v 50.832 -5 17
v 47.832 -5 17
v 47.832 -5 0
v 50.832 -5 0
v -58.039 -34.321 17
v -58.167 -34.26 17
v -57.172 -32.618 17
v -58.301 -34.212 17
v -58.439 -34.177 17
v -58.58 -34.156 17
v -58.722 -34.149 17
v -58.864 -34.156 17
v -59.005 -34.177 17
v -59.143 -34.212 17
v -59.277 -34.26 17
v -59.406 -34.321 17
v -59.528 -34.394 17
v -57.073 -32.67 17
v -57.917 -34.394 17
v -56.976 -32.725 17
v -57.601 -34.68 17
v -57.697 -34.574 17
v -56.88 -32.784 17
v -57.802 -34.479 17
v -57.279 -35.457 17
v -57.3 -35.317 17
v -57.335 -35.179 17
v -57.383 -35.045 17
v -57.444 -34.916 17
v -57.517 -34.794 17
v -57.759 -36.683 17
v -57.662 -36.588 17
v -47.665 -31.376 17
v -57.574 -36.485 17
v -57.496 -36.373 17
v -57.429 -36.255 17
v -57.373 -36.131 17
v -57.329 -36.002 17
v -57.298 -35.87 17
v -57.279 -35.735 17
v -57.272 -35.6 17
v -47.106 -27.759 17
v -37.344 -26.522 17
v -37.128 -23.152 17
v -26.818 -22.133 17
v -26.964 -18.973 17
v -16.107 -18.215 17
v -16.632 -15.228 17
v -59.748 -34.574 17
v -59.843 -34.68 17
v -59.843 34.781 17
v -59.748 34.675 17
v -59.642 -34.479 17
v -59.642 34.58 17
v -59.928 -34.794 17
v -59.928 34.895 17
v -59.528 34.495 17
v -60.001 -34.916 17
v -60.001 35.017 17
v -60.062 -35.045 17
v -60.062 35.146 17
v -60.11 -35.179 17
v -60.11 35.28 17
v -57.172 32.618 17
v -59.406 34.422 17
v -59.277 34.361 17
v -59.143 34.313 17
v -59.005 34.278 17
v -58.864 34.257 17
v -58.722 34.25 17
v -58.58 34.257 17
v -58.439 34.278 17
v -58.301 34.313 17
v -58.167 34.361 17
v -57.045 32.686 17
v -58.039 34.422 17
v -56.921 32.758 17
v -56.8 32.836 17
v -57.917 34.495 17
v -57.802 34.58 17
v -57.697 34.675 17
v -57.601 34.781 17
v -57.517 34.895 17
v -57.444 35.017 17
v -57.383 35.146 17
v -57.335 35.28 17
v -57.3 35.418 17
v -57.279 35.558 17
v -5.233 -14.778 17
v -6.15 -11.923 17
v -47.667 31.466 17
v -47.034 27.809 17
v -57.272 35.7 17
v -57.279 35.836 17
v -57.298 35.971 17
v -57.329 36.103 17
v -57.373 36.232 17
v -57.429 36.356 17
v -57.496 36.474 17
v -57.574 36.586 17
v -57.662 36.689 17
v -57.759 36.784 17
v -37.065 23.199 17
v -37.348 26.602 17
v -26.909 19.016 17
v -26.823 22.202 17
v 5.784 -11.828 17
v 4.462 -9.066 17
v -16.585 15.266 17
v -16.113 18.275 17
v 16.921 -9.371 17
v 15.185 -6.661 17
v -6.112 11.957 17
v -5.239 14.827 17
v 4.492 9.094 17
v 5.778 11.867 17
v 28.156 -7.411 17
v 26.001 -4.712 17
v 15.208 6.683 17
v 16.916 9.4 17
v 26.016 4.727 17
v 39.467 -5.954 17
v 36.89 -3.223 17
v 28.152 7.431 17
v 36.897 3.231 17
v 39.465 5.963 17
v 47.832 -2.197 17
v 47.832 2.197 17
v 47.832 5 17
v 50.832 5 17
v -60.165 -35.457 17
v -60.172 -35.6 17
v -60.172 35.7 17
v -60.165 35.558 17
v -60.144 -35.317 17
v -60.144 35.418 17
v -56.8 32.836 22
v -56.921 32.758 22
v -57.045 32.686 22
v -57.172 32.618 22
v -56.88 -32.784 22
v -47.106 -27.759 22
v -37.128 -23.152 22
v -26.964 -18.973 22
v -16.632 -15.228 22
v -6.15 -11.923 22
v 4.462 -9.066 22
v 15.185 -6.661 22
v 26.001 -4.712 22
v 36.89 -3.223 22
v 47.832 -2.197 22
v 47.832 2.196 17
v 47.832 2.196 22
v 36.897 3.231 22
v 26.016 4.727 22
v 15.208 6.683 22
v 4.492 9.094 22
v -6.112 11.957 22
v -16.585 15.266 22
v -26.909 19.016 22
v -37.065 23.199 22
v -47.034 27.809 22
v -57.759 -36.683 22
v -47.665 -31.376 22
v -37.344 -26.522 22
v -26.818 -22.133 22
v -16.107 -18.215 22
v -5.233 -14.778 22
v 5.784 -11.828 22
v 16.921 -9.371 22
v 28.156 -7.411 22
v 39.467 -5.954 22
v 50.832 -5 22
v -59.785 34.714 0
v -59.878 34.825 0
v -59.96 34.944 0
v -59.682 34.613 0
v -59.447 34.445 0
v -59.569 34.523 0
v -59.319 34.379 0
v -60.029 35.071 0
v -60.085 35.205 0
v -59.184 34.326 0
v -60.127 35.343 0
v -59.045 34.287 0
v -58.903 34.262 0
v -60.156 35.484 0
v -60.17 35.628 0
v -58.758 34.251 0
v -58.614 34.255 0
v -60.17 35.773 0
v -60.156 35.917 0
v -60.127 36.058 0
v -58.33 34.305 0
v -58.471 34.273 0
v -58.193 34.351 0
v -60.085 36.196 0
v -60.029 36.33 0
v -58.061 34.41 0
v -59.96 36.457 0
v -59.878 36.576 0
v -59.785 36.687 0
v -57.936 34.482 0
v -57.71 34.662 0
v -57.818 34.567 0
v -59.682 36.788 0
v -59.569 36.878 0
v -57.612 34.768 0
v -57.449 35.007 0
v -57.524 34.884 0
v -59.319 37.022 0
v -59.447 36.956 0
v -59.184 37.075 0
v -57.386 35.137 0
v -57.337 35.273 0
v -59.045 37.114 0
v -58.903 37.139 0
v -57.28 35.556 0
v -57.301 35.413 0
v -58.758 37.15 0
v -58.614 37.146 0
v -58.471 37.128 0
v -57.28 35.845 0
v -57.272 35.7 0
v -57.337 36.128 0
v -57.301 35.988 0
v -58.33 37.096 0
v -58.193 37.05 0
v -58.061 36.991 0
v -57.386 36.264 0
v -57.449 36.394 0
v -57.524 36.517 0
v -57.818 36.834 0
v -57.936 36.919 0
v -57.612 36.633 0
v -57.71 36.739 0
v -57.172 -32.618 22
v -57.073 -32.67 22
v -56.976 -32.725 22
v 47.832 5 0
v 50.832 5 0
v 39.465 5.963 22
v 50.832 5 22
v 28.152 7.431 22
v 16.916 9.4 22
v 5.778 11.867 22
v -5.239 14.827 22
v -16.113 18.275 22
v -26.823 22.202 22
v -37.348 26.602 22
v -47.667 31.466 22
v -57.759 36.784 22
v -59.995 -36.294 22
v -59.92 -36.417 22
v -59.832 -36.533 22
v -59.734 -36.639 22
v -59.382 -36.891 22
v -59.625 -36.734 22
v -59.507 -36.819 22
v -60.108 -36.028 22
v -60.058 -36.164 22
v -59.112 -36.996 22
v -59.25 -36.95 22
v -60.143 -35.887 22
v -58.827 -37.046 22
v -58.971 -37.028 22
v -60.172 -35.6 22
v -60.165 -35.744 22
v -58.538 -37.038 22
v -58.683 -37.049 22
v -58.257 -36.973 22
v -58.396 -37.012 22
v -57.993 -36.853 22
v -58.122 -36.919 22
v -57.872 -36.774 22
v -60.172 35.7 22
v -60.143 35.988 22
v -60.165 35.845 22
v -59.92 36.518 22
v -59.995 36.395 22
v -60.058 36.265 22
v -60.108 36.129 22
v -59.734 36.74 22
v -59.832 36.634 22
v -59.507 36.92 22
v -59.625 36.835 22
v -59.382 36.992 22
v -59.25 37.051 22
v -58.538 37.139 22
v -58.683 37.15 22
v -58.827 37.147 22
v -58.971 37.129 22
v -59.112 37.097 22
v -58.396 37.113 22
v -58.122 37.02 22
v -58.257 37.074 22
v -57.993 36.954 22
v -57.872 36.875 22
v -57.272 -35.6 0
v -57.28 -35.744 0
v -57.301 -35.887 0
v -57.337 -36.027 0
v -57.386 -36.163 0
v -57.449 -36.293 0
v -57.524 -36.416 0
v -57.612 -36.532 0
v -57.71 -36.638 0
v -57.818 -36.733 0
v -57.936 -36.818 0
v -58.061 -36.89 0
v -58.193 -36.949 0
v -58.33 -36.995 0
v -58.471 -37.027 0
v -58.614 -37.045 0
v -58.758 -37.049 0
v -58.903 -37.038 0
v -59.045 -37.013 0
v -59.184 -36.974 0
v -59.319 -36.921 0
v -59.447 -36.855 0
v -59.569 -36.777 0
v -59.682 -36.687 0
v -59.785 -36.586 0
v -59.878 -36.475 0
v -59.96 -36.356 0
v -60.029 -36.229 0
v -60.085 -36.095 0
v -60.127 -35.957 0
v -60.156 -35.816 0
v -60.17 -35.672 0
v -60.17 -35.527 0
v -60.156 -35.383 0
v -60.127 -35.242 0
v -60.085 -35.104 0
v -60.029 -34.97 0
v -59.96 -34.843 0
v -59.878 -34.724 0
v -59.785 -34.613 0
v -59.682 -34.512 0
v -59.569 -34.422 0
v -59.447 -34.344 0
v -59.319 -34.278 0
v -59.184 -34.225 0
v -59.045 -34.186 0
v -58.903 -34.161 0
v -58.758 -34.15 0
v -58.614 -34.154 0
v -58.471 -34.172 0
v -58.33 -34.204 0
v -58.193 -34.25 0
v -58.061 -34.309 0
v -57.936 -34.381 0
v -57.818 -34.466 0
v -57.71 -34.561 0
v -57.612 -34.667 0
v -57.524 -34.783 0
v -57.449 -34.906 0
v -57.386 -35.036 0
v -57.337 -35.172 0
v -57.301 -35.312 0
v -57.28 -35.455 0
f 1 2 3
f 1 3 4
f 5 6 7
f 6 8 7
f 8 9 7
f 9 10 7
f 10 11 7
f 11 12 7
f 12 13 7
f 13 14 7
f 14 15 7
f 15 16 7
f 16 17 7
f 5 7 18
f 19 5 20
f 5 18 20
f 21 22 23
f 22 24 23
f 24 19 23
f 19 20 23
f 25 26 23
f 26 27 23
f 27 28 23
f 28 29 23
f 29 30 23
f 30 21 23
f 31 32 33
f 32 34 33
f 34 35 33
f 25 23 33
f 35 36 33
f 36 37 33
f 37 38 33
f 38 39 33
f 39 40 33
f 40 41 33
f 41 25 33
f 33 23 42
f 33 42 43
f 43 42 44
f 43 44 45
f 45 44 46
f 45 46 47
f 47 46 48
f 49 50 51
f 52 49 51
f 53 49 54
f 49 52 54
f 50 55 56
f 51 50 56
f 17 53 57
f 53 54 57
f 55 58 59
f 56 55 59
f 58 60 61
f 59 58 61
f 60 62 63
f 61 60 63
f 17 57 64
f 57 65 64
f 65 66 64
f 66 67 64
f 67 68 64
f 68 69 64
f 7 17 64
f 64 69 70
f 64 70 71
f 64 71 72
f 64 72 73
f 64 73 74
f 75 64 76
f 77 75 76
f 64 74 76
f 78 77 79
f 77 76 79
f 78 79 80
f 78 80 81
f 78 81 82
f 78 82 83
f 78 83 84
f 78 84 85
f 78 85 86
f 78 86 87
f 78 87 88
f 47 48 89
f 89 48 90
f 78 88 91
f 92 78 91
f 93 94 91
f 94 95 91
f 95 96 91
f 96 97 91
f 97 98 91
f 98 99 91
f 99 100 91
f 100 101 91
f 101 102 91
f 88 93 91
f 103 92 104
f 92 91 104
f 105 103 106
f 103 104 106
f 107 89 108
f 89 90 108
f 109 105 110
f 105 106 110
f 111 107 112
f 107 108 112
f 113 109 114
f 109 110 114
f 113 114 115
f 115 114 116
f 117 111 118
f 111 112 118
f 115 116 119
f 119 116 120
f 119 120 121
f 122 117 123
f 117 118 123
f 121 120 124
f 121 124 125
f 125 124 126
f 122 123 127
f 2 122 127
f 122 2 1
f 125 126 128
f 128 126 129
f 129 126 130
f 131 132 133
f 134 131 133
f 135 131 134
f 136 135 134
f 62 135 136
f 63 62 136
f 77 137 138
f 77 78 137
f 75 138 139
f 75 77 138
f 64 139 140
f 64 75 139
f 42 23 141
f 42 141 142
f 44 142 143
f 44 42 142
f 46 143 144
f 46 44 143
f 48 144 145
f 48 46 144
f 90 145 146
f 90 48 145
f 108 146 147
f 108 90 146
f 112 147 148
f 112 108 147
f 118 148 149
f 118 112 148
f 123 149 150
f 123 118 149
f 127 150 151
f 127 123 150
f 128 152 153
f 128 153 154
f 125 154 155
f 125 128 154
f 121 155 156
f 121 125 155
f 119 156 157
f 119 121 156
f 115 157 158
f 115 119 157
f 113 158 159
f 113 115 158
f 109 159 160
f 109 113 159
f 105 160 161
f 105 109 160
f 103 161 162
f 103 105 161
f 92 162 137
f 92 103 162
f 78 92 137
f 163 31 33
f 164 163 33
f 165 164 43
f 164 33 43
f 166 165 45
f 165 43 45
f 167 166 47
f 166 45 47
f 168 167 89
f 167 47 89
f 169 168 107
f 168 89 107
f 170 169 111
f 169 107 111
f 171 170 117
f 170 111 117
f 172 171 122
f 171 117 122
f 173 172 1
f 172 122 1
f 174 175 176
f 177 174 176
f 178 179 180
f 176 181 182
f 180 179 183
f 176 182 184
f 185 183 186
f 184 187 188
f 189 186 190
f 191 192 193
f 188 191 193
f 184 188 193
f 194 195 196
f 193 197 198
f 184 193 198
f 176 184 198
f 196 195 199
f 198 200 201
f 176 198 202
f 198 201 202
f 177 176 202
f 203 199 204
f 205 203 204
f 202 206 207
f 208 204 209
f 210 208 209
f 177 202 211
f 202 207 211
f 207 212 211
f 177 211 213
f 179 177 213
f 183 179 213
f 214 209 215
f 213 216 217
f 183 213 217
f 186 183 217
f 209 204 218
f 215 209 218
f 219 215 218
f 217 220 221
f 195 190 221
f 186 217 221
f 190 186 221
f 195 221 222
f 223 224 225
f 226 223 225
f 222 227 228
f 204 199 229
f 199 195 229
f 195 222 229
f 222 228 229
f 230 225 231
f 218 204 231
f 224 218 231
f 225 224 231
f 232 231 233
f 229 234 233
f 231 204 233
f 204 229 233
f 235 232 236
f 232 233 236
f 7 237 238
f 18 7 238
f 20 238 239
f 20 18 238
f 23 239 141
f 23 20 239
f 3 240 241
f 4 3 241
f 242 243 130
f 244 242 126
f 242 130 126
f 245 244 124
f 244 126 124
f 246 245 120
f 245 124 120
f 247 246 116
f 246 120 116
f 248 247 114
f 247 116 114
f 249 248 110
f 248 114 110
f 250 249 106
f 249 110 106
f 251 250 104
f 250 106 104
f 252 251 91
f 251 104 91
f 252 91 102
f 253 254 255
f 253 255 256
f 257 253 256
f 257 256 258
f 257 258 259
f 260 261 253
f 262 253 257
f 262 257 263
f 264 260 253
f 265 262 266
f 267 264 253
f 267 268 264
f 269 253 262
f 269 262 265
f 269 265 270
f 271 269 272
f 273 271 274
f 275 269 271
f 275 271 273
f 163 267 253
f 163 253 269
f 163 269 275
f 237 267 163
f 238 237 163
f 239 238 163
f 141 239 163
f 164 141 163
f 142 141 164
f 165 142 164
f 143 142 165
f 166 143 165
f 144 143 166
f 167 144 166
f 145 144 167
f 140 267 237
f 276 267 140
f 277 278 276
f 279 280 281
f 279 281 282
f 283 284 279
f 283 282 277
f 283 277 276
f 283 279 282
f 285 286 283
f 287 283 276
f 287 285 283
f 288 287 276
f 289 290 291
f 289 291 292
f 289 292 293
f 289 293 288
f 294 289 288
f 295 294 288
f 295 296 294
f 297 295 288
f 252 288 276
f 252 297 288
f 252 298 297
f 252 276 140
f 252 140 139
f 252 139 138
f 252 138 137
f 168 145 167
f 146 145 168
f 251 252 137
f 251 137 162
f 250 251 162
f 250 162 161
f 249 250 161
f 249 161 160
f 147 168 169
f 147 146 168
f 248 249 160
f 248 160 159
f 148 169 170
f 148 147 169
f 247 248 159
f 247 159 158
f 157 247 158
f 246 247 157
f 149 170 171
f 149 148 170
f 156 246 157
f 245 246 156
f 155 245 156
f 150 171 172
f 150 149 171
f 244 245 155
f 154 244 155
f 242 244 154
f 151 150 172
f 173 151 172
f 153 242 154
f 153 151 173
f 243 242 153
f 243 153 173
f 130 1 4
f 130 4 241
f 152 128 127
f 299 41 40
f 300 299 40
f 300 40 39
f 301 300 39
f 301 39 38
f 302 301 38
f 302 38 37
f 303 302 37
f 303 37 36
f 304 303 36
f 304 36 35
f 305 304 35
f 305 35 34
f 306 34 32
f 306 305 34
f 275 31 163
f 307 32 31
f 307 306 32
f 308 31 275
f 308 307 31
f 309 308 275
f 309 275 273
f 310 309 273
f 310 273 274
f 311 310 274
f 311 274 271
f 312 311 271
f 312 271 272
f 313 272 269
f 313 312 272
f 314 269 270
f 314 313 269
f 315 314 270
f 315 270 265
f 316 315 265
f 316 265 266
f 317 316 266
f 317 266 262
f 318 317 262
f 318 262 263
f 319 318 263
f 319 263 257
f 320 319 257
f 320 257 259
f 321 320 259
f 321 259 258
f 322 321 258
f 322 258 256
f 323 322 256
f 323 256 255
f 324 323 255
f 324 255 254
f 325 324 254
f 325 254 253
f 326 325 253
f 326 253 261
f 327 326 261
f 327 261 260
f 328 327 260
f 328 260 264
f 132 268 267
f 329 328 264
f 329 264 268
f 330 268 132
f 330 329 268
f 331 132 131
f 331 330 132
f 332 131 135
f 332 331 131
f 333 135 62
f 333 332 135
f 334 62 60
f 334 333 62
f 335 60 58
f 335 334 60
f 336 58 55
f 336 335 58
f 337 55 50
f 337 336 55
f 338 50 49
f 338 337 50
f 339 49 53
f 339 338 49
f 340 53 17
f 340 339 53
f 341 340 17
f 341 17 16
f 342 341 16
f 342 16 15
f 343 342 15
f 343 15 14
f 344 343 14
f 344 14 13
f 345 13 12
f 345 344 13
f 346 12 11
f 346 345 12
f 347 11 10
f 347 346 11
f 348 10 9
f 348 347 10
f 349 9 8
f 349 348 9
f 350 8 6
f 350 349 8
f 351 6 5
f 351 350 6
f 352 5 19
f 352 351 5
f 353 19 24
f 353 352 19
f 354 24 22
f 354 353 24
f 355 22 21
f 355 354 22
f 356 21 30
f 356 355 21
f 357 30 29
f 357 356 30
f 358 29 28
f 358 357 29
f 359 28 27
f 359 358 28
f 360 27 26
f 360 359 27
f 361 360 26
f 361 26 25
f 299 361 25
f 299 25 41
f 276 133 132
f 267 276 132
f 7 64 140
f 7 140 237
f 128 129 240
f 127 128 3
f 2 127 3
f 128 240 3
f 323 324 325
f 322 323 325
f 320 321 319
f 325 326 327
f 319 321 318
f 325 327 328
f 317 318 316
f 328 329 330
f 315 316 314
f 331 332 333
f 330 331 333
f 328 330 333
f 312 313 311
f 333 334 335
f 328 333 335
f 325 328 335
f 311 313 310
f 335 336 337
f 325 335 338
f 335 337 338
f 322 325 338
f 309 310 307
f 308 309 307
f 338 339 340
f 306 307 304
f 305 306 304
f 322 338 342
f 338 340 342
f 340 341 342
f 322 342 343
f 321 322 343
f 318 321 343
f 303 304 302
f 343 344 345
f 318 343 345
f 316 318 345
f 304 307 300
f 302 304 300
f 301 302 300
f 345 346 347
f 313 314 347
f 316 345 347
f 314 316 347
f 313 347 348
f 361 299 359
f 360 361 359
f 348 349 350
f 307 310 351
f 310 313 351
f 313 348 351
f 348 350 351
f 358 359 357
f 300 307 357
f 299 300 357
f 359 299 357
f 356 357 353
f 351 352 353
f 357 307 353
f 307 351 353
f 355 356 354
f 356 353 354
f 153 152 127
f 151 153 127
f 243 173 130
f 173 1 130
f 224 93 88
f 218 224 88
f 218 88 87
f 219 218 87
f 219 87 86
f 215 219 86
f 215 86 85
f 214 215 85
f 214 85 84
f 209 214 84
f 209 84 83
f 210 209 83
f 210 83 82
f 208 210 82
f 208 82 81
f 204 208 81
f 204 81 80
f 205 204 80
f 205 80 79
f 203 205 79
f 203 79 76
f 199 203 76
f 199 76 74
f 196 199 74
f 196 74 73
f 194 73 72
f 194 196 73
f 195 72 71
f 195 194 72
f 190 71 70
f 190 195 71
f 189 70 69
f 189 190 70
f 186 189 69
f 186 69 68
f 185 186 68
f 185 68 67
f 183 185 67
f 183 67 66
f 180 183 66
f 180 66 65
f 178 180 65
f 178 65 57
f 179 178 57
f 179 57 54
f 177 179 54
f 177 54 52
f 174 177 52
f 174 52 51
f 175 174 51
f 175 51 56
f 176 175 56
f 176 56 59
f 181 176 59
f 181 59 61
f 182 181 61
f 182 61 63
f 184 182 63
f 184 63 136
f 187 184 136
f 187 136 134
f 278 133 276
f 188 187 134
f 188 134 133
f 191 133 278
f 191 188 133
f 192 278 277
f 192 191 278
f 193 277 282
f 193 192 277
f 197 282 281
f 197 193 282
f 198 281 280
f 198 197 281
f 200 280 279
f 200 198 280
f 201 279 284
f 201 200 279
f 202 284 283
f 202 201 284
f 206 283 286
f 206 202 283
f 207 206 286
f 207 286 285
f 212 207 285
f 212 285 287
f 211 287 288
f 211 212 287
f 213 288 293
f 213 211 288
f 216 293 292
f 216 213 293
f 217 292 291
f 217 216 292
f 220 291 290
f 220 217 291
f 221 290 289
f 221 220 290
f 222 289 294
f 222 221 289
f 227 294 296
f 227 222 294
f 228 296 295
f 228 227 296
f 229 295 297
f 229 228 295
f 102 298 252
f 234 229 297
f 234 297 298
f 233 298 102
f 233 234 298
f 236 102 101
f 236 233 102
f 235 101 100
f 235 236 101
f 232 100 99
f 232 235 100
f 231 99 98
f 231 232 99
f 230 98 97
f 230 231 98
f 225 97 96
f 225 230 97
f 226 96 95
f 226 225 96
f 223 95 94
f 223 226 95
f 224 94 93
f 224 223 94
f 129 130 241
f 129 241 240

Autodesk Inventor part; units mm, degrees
ref_plane "YZ Plane" through (0, 0, 0) normal (1, 0, 0) x (0, 1, 0)
ref_plane "XZ Plane" through (0, 0, 0) normal (0, 1, 0) x (-1, 0, 0)
ref_plane "XY Plane" through (0, 0, 0) normal (0, 0, 1) x (1, 0, 0)
sketch "Náčrt1" plane through (0, 0, 0) normal (0, 0, 1) x (1, 0, 0)
  line L0 (47.8317, -5) -> (50.8317, -5)
  line L1 (50.8317, -5) -> (50.8317, 5)
  line L2 (50.8317, 5) -> (47.8317, 5)
  line L3 (47.8317, 5) -> (47.8317, -5)
  line L4 (47.8317, -5) -> (50.8317, 5) construction
  line L5 (50.8317, -5) -> (47.8317, 5) construction
  circle A0 centre (-58.7223, 35.7005) radius 1.45
  circle A1 centre (-58.7223, -35.5995) radius 1.45
  point P0 (0, 0)
  point P1 (50.8317, 0)
  point P2 (-60.1683, 0.0505)
  dimension "d7" = 10
  dimension "d8" = 5
  dimension "d13" = 2.9
  dimension "d14" = 74.2
extrude "Vysunutí1" add sketch "Náčrt1" along normal blind 17
sketch "Náčrt2" plane through (-58.7223, 35.7005, 17) normal (0, 0, 1) x (1, 0, 0)
  circle A0 centre (0, 0) radius 1.45 projected
  line L0 (109.5541, -40.7005) -> (109.5541, -30.7005) projected
  arc A1 (0.9632, 1.0839) -> (109.5541, -30.7005) centre (125.5077, 225.1962) ccw
  circle A2 centre (0, -71.3) radius 1.45 projected
  line L1 (-1.45, 0) -> (-1.45, -71.3)
  arc A3 (109.5541, -40.7005) -> (0.9632, -72.3839) centre (125.3027, -296.61) ccw
  arc A4 (1.55, -3.0822) -> (1.9226, -2.8646) centre (0, 0) ccw
  line L2 (106.5541, -33.504) -> (106.5541, -37.8971)
  arc A5 (106.5541, -37.8971) -> (1.8423, -68.4842) centre (125.3027, -296.61) ccw
  arc A6 (1.8423, -68.4842) -> (1.55, -68.3189) centre (0, -71.4011) ccw
  line L3 (106.5541, -37.8971) -> (106.5541, -33.504)
  line L4 (1.55, -3.0822) -> (1.55, -68.3189)
  arc A7 (1.9226, -2.8646) -> (106.5541, -33.504) centre (125.5077, 225.1962) ccw
  line L5 (109.5541, -30.7005) -> (109.5541, -40.7005)
  arc A8 (0.4127, -72.69) -> (0.9632, -72.3839) centre (0, -71.3) ccw
  arc A9 (0.9632, 1.0839) -> (-1.45, 0) centre (0, 0) ccw
  arc A10 (0.9632, 1.0839) -> (-1.45, 0) centre (0, 0) ccw
  arc A11 (-1.45, -71.3) -> (0.9632, -72.3839) centre (0, -71.3) ccw
  point P0 (58.7223, -35.7005)
  point P1 (3.4391, -0.2742)
  point P2 (-1.45, -3.1305)
  point P3 (3.4391, -71.1268)
  point P4 (-1.45, -68.2706)
  point P5 (109.5541, -35.7005)
  point P6 (106.5541, -35.7005)
  dimension "d20" = 2
  dimension "d23" = 3
extrude "Vysunutí2" add sketch "Náčrt2" along normal blind 5
properties part number "drzak_baterie"
